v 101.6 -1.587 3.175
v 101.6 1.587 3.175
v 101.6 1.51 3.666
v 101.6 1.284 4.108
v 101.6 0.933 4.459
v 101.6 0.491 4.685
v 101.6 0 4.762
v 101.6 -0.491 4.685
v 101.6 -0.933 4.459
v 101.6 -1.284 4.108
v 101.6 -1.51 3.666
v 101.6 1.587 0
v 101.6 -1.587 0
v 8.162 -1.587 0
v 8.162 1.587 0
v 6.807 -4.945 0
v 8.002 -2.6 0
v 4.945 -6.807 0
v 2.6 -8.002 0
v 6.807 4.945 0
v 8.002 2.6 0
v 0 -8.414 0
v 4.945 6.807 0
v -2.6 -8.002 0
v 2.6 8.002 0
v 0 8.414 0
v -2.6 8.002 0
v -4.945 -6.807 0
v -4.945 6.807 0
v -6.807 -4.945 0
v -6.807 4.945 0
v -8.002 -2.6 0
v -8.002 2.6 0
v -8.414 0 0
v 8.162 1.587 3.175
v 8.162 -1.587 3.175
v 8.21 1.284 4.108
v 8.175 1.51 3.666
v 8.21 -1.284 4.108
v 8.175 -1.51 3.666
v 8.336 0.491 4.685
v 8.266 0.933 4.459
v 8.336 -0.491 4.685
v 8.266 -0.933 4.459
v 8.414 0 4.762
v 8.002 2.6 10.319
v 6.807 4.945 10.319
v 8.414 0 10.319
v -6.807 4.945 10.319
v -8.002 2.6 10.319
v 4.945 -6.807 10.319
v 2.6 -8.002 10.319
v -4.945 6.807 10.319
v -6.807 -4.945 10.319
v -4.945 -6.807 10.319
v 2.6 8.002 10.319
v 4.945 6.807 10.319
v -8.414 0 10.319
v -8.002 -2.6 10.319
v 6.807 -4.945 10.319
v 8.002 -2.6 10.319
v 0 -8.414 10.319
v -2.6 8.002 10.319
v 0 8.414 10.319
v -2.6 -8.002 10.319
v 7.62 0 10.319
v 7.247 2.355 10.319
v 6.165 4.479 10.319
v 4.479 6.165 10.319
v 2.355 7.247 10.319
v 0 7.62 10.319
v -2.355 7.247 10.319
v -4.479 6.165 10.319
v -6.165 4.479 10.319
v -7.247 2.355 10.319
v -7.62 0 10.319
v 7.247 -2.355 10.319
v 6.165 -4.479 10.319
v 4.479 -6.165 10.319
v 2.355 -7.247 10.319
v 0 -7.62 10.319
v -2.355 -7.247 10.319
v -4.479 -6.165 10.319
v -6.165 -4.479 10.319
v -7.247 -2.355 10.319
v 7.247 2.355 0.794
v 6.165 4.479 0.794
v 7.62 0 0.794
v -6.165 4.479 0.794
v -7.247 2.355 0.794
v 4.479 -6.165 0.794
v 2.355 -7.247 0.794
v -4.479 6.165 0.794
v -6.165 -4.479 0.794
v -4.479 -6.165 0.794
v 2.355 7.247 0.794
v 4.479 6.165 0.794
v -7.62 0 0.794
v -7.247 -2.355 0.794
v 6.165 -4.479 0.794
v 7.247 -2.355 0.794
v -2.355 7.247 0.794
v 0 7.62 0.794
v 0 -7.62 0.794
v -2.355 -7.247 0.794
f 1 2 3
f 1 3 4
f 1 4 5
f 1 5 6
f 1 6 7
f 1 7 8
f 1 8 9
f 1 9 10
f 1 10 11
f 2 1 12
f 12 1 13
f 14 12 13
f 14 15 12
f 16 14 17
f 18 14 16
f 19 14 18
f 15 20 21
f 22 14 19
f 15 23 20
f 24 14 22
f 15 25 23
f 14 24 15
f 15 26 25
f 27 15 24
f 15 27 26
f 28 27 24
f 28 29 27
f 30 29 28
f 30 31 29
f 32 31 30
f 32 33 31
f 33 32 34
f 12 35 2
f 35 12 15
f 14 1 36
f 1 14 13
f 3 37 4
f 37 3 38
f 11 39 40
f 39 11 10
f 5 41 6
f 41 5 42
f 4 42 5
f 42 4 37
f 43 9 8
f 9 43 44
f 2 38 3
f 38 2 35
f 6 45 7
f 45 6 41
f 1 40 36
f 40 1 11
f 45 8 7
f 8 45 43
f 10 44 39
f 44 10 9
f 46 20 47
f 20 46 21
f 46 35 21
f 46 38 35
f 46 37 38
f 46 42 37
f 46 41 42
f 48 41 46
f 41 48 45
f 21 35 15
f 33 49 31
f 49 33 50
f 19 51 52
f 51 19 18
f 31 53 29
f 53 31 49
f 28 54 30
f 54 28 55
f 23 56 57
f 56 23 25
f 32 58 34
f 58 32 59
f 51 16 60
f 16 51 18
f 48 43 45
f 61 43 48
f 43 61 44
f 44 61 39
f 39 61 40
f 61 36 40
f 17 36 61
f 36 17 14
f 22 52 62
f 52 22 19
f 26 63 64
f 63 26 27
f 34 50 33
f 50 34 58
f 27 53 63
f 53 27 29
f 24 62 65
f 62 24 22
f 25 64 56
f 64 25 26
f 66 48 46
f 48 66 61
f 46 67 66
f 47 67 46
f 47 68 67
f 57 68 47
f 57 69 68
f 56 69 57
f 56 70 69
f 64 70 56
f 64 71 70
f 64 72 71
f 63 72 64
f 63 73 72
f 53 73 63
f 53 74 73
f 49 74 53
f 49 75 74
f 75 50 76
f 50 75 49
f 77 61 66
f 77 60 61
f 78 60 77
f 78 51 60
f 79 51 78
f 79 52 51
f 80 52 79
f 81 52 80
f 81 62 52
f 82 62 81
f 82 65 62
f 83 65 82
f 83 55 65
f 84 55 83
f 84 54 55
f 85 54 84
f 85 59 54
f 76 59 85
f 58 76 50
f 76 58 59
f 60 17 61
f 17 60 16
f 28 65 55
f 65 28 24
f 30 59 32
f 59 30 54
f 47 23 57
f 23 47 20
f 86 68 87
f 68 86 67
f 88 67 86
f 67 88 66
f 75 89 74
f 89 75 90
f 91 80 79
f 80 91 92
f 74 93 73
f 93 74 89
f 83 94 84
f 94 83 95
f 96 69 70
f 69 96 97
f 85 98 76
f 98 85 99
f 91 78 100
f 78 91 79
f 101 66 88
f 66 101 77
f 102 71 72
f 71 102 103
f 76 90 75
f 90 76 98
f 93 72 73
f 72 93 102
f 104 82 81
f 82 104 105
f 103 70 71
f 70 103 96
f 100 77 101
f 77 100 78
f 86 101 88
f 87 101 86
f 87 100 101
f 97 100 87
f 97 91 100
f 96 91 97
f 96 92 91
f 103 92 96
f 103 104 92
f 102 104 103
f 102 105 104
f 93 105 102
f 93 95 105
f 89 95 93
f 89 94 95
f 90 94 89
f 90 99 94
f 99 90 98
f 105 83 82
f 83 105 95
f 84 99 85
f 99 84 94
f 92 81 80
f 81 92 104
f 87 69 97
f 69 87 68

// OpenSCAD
module PowderScoop(chargeDiameter=0.6, chargeHeight=3/8, wall=1/32,
                   handleLength=4, handleHeight=1/4, handleWidth=1/8) {
  difference() {
    union() {
      
      // Handle
      translate([0,-handleWidth/2,0])
      cube([handleLength, handleWidth, handleHeight/2]);
      
      // Handle Curve
      translate([0,0,handleHeight/2])
      rotate([0,90,0])
      cylinder(r=handleWidth/2, h=handleLength, $fn=20);
      
      // Scoop Body
      cylinder(r=(chargeDiameter/2) + wall, h=chargeHeight + wall, $fn=20);
    }
    
    translate([0,0,wall])
    cylinder(r=chargeDiameter/2, h=chargeHeight + 0.1, $fn=20);
  }
}

scale([25.4, 25.4, 25.4]) PowderScoop();
